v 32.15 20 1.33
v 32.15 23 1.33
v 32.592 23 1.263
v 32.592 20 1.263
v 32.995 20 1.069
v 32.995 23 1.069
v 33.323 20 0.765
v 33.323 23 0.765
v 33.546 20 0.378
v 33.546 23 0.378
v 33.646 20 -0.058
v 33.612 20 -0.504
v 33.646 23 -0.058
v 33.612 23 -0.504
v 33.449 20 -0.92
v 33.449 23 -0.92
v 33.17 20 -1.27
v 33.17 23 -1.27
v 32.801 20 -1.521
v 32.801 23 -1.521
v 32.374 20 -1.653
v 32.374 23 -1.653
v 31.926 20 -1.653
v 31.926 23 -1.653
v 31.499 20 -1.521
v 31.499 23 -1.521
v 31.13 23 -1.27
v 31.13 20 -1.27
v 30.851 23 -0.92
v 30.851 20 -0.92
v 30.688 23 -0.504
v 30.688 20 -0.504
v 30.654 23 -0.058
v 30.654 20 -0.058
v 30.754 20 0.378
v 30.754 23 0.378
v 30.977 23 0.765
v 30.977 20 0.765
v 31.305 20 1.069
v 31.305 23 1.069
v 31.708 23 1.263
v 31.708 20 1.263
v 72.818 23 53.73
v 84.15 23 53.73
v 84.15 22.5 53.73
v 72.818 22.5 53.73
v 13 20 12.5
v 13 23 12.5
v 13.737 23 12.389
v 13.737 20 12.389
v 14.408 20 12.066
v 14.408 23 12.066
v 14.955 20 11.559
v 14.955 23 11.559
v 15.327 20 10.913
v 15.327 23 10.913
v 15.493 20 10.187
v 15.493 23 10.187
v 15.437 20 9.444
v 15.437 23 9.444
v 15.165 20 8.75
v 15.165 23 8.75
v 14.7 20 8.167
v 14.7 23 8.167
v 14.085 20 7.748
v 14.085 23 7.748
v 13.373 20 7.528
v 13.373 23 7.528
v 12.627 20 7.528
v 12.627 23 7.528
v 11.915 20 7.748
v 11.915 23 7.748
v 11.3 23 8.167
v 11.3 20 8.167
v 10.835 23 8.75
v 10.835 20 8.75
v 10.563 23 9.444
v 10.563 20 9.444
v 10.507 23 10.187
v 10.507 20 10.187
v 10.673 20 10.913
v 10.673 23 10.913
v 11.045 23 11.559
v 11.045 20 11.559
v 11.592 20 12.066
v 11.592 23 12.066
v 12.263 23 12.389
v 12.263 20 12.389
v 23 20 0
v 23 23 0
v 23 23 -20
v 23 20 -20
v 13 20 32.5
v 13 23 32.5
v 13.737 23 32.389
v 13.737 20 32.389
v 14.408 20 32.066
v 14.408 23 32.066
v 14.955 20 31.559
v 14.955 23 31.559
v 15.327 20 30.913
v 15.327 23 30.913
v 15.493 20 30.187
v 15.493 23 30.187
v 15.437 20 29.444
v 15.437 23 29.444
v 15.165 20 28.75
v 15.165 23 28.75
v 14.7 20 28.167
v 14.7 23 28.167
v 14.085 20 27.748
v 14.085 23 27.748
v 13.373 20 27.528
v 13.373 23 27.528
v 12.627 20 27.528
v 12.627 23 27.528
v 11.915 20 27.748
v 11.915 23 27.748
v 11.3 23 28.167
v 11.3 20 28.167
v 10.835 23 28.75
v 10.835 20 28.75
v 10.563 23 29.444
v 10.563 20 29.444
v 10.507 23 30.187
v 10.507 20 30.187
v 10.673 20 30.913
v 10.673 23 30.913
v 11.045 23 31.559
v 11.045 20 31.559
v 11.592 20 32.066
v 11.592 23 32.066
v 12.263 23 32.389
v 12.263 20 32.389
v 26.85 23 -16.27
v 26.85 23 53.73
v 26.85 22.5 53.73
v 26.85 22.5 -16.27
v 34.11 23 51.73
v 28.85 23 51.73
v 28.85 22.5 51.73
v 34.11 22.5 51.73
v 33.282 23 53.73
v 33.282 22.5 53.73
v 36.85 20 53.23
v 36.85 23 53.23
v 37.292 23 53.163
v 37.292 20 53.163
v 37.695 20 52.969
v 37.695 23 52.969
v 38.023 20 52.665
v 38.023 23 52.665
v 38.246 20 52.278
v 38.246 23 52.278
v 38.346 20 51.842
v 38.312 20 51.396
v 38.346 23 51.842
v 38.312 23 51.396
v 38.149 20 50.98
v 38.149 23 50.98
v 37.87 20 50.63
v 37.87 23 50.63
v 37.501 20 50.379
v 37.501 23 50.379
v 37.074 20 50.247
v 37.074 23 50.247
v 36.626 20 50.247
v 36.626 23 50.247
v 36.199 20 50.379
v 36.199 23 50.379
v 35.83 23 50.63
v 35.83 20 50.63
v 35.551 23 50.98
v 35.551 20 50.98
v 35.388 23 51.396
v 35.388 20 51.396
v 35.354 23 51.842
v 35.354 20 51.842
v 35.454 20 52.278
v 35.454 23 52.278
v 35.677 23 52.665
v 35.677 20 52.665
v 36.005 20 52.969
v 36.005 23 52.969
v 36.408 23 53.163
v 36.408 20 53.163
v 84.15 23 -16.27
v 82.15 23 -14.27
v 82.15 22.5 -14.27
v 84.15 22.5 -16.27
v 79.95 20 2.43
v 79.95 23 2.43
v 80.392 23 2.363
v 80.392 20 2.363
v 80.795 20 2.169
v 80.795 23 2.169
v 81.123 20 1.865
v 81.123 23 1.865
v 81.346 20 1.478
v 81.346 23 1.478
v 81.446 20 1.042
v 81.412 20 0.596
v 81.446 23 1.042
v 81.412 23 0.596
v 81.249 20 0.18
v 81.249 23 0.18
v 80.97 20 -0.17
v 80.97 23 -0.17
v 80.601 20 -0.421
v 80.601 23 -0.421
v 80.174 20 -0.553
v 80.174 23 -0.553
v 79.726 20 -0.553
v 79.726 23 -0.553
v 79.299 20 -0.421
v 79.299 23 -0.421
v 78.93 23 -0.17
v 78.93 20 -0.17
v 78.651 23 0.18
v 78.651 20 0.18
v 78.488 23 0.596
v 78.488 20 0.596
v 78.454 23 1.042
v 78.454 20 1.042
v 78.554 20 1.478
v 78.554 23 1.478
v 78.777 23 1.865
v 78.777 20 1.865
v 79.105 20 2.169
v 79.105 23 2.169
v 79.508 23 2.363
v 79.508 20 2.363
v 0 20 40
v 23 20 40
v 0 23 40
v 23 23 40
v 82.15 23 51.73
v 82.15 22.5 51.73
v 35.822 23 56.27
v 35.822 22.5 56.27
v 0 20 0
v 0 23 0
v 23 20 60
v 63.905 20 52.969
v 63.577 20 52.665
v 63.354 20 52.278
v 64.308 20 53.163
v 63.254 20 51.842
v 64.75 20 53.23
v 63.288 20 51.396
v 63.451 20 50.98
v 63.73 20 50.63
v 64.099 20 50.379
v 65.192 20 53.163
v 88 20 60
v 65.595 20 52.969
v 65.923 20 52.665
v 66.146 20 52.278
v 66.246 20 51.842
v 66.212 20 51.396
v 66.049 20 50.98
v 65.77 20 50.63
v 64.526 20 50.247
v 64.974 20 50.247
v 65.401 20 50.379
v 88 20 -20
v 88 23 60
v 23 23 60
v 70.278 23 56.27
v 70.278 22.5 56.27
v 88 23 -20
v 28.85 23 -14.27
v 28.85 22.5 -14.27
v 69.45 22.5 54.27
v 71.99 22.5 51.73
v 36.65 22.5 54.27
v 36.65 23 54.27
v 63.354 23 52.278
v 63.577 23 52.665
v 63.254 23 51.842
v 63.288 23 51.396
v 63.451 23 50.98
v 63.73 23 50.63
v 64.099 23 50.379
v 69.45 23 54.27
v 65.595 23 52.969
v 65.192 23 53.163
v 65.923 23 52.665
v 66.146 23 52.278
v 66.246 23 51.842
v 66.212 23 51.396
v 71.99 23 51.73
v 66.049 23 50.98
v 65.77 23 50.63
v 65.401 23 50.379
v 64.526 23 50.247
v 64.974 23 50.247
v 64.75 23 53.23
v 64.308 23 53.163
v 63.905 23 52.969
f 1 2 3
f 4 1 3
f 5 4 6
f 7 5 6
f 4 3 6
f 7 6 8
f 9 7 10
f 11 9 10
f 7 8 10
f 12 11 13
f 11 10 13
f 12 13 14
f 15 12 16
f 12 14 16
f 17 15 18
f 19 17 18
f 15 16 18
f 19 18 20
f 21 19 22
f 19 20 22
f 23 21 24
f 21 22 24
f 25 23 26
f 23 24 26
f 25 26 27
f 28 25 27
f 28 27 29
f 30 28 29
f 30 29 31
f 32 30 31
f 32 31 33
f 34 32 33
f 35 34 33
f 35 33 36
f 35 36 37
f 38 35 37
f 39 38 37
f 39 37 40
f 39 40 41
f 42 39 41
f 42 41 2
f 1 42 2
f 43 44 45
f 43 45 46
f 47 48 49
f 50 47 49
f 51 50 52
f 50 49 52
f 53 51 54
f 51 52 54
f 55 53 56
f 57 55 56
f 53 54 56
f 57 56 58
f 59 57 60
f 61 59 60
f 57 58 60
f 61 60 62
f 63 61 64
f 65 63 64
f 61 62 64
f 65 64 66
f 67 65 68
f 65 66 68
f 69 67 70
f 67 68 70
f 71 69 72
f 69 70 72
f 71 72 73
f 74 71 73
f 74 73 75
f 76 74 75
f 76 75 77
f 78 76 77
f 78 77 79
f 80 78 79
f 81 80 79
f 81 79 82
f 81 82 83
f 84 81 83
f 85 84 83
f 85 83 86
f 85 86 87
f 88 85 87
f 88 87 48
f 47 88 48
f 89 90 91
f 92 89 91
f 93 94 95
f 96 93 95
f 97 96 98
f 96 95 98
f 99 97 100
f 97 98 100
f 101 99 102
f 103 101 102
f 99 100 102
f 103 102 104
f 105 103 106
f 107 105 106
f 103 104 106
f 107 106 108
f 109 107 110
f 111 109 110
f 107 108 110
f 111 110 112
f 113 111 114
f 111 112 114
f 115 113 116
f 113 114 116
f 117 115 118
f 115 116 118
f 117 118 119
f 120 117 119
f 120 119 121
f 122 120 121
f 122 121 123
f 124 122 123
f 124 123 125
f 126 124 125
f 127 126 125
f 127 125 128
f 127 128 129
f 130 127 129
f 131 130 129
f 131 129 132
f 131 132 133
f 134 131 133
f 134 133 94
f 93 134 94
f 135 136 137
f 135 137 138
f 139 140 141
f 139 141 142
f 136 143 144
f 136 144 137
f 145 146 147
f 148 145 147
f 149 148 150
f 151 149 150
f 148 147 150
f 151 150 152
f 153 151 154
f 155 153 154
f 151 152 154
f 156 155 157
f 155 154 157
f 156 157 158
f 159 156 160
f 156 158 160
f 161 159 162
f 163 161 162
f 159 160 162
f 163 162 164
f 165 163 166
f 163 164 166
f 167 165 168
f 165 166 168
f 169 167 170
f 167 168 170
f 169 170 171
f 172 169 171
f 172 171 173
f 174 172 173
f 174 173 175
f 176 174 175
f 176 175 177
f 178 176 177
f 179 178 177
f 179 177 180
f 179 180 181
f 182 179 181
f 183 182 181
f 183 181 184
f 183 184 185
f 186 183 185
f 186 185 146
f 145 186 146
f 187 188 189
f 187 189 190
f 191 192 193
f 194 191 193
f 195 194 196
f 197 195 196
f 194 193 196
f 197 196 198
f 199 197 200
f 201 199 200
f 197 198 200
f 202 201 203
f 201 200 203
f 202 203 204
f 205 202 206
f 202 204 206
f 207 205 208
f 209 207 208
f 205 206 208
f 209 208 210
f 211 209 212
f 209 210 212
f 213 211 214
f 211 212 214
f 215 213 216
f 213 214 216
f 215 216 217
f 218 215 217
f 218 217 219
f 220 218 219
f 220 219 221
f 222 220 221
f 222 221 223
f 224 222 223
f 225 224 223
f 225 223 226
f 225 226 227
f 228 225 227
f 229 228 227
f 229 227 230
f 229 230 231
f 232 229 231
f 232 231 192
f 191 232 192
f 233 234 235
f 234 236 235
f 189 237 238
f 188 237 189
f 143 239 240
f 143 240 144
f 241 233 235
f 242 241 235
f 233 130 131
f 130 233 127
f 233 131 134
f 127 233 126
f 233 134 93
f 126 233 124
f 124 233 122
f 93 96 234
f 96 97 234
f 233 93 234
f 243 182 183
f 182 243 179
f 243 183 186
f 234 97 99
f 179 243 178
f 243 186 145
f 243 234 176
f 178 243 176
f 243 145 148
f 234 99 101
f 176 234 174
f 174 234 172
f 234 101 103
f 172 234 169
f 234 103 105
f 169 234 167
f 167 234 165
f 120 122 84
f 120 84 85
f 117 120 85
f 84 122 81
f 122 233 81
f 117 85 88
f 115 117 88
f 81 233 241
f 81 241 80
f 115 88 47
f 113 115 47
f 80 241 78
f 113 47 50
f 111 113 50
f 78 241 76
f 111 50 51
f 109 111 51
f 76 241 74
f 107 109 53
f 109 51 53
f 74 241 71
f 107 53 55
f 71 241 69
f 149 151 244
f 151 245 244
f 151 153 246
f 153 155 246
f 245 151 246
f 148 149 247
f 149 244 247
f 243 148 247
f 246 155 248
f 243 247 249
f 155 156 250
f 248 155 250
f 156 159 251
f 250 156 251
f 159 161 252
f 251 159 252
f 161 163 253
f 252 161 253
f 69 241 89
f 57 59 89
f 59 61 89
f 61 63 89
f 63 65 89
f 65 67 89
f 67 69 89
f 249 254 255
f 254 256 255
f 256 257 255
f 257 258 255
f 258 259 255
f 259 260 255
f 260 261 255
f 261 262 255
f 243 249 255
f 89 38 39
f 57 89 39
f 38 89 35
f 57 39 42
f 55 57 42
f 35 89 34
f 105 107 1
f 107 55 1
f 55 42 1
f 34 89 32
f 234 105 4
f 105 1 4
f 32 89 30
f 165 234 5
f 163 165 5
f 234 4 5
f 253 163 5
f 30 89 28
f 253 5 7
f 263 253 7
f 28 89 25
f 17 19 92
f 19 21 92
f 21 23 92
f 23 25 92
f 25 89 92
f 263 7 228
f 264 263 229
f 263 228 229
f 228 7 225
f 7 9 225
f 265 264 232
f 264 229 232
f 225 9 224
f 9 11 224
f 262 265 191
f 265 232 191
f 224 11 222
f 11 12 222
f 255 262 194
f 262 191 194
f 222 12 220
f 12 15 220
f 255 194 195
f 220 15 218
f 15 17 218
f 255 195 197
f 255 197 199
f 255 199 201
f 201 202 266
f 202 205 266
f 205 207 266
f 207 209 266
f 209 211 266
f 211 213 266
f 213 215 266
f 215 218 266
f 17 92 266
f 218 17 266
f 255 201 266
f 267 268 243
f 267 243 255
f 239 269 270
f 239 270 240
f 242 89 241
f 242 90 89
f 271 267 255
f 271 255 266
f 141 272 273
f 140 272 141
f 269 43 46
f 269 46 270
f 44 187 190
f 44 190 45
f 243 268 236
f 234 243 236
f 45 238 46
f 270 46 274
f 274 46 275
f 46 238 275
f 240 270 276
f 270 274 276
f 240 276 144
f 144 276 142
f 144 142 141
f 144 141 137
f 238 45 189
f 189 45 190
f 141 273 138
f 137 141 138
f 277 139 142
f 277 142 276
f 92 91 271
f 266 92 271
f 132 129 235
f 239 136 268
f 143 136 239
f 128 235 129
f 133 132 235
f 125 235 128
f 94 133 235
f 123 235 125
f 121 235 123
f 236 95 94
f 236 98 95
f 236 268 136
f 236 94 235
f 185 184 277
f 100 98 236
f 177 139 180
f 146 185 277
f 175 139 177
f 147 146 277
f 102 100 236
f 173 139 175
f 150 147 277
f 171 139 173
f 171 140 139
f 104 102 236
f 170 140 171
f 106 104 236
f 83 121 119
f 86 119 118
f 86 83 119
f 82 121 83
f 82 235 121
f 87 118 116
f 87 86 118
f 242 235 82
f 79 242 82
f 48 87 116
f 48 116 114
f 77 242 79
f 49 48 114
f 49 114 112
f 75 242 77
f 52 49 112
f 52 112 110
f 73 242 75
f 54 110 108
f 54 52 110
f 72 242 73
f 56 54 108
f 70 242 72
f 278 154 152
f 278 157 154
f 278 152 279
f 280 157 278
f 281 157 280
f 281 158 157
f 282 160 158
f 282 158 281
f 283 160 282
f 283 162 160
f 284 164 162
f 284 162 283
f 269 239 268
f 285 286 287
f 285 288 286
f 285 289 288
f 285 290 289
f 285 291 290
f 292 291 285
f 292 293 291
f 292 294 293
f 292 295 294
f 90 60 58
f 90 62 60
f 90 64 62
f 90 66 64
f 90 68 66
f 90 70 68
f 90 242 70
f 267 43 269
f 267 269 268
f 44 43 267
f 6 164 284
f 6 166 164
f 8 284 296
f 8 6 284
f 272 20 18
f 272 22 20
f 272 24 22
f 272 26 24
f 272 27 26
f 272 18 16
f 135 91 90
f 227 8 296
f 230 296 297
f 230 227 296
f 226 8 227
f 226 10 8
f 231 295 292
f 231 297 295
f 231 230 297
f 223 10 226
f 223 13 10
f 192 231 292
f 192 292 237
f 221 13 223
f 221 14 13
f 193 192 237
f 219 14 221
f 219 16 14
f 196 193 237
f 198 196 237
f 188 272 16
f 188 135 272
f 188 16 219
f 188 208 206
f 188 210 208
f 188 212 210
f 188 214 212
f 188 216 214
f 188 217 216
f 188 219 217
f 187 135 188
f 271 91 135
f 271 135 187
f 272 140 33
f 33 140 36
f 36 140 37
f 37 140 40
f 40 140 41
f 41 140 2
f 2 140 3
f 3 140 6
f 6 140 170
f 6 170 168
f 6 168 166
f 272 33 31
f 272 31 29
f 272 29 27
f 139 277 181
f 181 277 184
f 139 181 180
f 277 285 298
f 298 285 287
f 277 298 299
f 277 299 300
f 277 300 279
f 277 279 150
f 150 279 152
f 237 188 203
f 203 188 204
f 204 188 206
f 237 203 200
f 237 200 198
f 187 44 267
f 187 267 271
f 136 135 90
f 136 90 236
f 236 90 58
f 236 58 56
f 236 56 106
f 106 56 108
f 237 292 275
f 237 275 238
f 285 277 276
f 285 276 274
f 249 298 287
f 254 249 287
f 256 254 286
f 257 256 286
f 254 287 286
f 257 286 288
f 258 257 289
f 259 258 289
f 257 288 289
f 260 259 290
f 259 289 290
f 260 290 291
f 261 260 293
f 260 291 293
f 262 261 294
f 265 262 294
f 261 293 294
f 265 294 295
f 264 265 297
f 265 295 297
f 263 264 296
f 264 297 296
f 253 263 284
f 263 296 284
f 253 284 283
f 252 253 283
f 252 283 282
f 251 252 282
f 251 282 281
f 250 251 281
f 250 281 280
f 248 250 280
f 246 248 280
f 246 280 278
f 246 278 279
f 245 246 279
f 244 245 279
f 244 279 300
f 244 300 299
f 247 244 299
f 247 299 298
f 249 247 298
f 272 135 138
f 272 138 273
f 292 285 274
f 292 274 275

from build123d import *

# Parameters (mm, degrees)
BOSS_EXTRUDE1_DEPTH = 40
CUT_EXTRUDE1_REACH  = 53.556
SKETCH2_R           = 2.5
CUT_EXTRUDE2_REACH  = 53.556
SKETCH3_R           = 2.5
FILLET1_R           = 5
SKETCH4_W           = 65
SKETCH4_H           = 80
BOSS_EXTRUDE2_DEPTH = 3
CUT_EXTRUDE3_DEPTH  = 0.5
CUT_EXTRUDE4_REACH  = 110.963
SKETCH6_R           = 1.5
CUT_EXTRUDE5_REACH  = 110.963
SKETCH7_W           = 40
SKETCH7_H           = 20


with BuildPart() as part:
    # Sketch1 → Boss-Extrude1 (new body)
    with BuildSketch(Plane.XY):
        Polygon((0, 0), (0, 23), (23, 23), (23, 20), (3, 20), (3, 0), align=None)
    extrude(amount=BOSS_EXTRUDE1_DEPTH)

    # Sketch2 → Cut-Extrude1 (cut, up to next)
    with BuildSketch(Plane(origin=(0, 23, 0), x_dir=(1, 0, 0), z_dir=(0, 1, 0)), mode=Mode.PRIVATE) as cut_extrude1_sk1:
        with Locations(Location((13, -10, 0), (0, 0, 270))):
            Circle(SKETCH2_R)
    cut_extrude1_tool1 = extrude(cut_extrude1_sk1.sketch, amount=-CUT_EXTRUDE1_REACH, mode=Mode.PRIVATE) & part.part
    # Sketch2 → Cut-Extrude1 (cut, up to next)
    with BuildSketch(Plane(origin=(0, 23, 0), x_dir=(1, 0, 0), z_dir=(0, 1, 0)), mode=Mode.PRIVATE) as cut_extrude1_sk2:
        with Locations(Location((13, -30, 0), (0, 0, 270))):
            Circle(SKETCH2_R)
    cut_extrude1_tool2 = extrude(cut_extrude1_sk2.sketch, amount=-CUT_EXTRUDE1_REACH, mode=Mode.PRIVATE) & part.part
    add(cut_extrude1_tool1.solids().sort_by_distance((13, 23, 10))[0], mode=Mode.SUBTRACT)
    add(cut_extrude1_tool2.solids().sort_by_distance((13, 23, 30))[0], mode=Mode.SUBTRACT)

    # Sketch3 → Cut-Extrude2 (cut, up to next)
    with BuildSketch(Plane.ZY, mode=Mode.PRIVATE) as cut_extrude2_sk1:
        with Locations((10, 10)):
            Circle(SKETCH3_R)
    cut_extrude2_tool1 = extrude(cut_extrude2_sk1.sketch, amount=-CUT_EXTRUDE2_REACH, mode=Mode.PRIVATE) & part.part
    # Sketch3 → Cut-Extrude2 (cut, up to next)
    with BuildSketch(Plane.ZY, mode=Mode.PRIVATE) as cut_extrude2_sk2:
        with Locations((30, 10)):
            Circle(SKETCH3_R)
    cut_extrude2_tool2 = extrude(cut_extrude2_sk2.sketch, amount=-CUT_EXTRUDE2_REACH, mode=Mode.PRIVATE) & part.part
    add(cut_extrude2_tool1.solids().sort_by_distance((0, 10, 10))[0], mode=Mode.SUBTRACT)
    add(cut_extrude2_tool2.solids().sort_by_distance((0, 10, 30))[0], mode=Mode.SUBTRACT)

    # Fillet1
    fillet1_edges = [part.edges().sort_by_distance(p)[0] for p in [
        (1.5, 0, 40),
        (1.5, 0, 0),
    ]]
    fillet(fillet1_edges, radius=FILLET1_R)

    # Sketch4 → Boss-Extrude2 (add)
    with BuildSketch(Plane(origin=(0, 23, 0), x_dir=(1, 0, 0), z_dir=(0, 1, 0))):
        with Locations((55.5, -20)):
            Rectangle(SKETCH4_W, SKETCH4_H)
    extrude(amount=-BOSS_EXTRUDE2_DEPTH)

    # Sketch5 → Cut-Extrude3 (cut)
    with BuildSketch(Plane(origin=(0, 23, 0), x_dir=(1, 0, 0), z_dir=(0, 1, 0))):
        Polygon((28.85, 14.27), (28.85, -51.73), (34.11, -51.73), (36.65, -54.27), (69.45, -54.27), (71.99, -51.73), (82.15, -51.73), (82.15, 14.27), (84.15, 16.27), (84.15, -53.73), (72.818427125, -53.73), (70.278427125, -56.27), (35.821572875, -56.27), (33.281572875, -53.73), (26.85, -53.73), (26.85, 16.27), align=None)
    extrude(amount=-CUT_EXTRUDE3_DEPTH, mode=Mode.SUBTRACT)

    # Sketch6 → Cut-Extrude4 (cut, up to next)
    with BuildSketch(Plane(origin=(0, 23, 0), x_dir=(1, 0, 0), z_dir=(0, 1, 0)), mode=Mode.PRIVATE) as cut_extrude4_sk1:
        with Locations(Location((32.15, 0.17, 0), (0, 0, 270))):
            Circle(SKETCH6_R)
    cut_extrude4_tool1 = extrude(cut_extrude4_sk1.sketch, amount=-CUT_EXTRUDE4_REACH, mode=Mode.PRIVATE) & part.part
    # Sketch6 → Cut-Extrude4 (cut, up to next)
    with BuildSketch(Plane(origin=(0, 23, 0), x_dir=(1, 0, 0), z_dir=(0, 1, 0)), mode=Mode.PRIVATE) as cut_extrude4_sk2:
        with Locations(Location((79.95, -0.93, 0), (0, 0, 270))):
            Circle(SKETCH6_R)
    cut_extrude4_tool2 = extrude(cut_extrude4_sk2.sketch, amount=-CUT_EXTRUDE4_REACH, mode=Mode.PRIVATE) & part.part
    # Sketch6 → Cut-Extrude4 (cut, up to next)
    with BuildSketch(Plane(origin=(0, 23, 0), x_dir=(1, 0, 0), z_dir=(0, 1, 0)), mode=Mode.PRIVATE) as cut_extrude4_sk3:
        with Locations(Location((64.75, -51.73, 0), (0, 0, 270))):
            Circle(SKETCH6_R)
    cut_extrude4_tool3 = extrude(cut_extrude4_sk3.sketch, amount=-CUT_EXTRUDE4_REACH, mode=Mode.PRIVATE) & part.part
    # Sketch6 → Cut-Extrude4 (cut, up to next)
    with BuildSketch(Plane(origin=(0, 23, 0), x_dir=(1, 0, 0), z_dir=(0, 1, 0)), mode=Mode.PRIVATE) as cut_extrude4_sk4:
        with Locations(Location((36.85, -51.73, 0), (0, 0, 270))):
            Circle(SKETCH6_R)
    cut_extrude4_tool4 = extrude(cut_extrude4_sk4.sketch, amount=-CUT_EXTRUDE4_REACH, mode=Mode.PRIVATE) & part.part
    add(cut_extrude4_tool1.solids().sort_by_distance((32.15, 23, -0.17))[0], mode=Mode.SUBTRACT)
    add(cut_extrude4_tool2.solids().sort_by_distance((79.95, 23, 0.93))[0], mode=Mode.SUBTRACT)
    add(cut_extrude4_tool3.solids().sort_by_distance((64.75, 23, 51.73))[0], mode=Mode.SUBTRACT)
    add(cut_extrude4_tool4.solids().sort_by_distance((36.85, 23, 51.73))[0], mode=Mode.SUBTRACT)

    # Sketch7 → Cut-Extrude5 (cut, up to next)
    with BuildSketch(Plane.ZY, mode=Mode.PRIVATE) as cut_extrude5_sk1:
        with Locations((20, 10)):
            Rectangle(SKETCH7_W, SKETCH7_H)
    cut_extrude5_tool1 = extrude(cut_extrude5_sk1.sketch, amount=-CUT_EXTRUDE5_REACH, mode=Mode.PRIVATE) & part.part
    add(cut_extrude5_tool1.solids().sort_by_distance((0, 10, 20))[0], mode=Mode.SUBTRACT)


solid = part.part
